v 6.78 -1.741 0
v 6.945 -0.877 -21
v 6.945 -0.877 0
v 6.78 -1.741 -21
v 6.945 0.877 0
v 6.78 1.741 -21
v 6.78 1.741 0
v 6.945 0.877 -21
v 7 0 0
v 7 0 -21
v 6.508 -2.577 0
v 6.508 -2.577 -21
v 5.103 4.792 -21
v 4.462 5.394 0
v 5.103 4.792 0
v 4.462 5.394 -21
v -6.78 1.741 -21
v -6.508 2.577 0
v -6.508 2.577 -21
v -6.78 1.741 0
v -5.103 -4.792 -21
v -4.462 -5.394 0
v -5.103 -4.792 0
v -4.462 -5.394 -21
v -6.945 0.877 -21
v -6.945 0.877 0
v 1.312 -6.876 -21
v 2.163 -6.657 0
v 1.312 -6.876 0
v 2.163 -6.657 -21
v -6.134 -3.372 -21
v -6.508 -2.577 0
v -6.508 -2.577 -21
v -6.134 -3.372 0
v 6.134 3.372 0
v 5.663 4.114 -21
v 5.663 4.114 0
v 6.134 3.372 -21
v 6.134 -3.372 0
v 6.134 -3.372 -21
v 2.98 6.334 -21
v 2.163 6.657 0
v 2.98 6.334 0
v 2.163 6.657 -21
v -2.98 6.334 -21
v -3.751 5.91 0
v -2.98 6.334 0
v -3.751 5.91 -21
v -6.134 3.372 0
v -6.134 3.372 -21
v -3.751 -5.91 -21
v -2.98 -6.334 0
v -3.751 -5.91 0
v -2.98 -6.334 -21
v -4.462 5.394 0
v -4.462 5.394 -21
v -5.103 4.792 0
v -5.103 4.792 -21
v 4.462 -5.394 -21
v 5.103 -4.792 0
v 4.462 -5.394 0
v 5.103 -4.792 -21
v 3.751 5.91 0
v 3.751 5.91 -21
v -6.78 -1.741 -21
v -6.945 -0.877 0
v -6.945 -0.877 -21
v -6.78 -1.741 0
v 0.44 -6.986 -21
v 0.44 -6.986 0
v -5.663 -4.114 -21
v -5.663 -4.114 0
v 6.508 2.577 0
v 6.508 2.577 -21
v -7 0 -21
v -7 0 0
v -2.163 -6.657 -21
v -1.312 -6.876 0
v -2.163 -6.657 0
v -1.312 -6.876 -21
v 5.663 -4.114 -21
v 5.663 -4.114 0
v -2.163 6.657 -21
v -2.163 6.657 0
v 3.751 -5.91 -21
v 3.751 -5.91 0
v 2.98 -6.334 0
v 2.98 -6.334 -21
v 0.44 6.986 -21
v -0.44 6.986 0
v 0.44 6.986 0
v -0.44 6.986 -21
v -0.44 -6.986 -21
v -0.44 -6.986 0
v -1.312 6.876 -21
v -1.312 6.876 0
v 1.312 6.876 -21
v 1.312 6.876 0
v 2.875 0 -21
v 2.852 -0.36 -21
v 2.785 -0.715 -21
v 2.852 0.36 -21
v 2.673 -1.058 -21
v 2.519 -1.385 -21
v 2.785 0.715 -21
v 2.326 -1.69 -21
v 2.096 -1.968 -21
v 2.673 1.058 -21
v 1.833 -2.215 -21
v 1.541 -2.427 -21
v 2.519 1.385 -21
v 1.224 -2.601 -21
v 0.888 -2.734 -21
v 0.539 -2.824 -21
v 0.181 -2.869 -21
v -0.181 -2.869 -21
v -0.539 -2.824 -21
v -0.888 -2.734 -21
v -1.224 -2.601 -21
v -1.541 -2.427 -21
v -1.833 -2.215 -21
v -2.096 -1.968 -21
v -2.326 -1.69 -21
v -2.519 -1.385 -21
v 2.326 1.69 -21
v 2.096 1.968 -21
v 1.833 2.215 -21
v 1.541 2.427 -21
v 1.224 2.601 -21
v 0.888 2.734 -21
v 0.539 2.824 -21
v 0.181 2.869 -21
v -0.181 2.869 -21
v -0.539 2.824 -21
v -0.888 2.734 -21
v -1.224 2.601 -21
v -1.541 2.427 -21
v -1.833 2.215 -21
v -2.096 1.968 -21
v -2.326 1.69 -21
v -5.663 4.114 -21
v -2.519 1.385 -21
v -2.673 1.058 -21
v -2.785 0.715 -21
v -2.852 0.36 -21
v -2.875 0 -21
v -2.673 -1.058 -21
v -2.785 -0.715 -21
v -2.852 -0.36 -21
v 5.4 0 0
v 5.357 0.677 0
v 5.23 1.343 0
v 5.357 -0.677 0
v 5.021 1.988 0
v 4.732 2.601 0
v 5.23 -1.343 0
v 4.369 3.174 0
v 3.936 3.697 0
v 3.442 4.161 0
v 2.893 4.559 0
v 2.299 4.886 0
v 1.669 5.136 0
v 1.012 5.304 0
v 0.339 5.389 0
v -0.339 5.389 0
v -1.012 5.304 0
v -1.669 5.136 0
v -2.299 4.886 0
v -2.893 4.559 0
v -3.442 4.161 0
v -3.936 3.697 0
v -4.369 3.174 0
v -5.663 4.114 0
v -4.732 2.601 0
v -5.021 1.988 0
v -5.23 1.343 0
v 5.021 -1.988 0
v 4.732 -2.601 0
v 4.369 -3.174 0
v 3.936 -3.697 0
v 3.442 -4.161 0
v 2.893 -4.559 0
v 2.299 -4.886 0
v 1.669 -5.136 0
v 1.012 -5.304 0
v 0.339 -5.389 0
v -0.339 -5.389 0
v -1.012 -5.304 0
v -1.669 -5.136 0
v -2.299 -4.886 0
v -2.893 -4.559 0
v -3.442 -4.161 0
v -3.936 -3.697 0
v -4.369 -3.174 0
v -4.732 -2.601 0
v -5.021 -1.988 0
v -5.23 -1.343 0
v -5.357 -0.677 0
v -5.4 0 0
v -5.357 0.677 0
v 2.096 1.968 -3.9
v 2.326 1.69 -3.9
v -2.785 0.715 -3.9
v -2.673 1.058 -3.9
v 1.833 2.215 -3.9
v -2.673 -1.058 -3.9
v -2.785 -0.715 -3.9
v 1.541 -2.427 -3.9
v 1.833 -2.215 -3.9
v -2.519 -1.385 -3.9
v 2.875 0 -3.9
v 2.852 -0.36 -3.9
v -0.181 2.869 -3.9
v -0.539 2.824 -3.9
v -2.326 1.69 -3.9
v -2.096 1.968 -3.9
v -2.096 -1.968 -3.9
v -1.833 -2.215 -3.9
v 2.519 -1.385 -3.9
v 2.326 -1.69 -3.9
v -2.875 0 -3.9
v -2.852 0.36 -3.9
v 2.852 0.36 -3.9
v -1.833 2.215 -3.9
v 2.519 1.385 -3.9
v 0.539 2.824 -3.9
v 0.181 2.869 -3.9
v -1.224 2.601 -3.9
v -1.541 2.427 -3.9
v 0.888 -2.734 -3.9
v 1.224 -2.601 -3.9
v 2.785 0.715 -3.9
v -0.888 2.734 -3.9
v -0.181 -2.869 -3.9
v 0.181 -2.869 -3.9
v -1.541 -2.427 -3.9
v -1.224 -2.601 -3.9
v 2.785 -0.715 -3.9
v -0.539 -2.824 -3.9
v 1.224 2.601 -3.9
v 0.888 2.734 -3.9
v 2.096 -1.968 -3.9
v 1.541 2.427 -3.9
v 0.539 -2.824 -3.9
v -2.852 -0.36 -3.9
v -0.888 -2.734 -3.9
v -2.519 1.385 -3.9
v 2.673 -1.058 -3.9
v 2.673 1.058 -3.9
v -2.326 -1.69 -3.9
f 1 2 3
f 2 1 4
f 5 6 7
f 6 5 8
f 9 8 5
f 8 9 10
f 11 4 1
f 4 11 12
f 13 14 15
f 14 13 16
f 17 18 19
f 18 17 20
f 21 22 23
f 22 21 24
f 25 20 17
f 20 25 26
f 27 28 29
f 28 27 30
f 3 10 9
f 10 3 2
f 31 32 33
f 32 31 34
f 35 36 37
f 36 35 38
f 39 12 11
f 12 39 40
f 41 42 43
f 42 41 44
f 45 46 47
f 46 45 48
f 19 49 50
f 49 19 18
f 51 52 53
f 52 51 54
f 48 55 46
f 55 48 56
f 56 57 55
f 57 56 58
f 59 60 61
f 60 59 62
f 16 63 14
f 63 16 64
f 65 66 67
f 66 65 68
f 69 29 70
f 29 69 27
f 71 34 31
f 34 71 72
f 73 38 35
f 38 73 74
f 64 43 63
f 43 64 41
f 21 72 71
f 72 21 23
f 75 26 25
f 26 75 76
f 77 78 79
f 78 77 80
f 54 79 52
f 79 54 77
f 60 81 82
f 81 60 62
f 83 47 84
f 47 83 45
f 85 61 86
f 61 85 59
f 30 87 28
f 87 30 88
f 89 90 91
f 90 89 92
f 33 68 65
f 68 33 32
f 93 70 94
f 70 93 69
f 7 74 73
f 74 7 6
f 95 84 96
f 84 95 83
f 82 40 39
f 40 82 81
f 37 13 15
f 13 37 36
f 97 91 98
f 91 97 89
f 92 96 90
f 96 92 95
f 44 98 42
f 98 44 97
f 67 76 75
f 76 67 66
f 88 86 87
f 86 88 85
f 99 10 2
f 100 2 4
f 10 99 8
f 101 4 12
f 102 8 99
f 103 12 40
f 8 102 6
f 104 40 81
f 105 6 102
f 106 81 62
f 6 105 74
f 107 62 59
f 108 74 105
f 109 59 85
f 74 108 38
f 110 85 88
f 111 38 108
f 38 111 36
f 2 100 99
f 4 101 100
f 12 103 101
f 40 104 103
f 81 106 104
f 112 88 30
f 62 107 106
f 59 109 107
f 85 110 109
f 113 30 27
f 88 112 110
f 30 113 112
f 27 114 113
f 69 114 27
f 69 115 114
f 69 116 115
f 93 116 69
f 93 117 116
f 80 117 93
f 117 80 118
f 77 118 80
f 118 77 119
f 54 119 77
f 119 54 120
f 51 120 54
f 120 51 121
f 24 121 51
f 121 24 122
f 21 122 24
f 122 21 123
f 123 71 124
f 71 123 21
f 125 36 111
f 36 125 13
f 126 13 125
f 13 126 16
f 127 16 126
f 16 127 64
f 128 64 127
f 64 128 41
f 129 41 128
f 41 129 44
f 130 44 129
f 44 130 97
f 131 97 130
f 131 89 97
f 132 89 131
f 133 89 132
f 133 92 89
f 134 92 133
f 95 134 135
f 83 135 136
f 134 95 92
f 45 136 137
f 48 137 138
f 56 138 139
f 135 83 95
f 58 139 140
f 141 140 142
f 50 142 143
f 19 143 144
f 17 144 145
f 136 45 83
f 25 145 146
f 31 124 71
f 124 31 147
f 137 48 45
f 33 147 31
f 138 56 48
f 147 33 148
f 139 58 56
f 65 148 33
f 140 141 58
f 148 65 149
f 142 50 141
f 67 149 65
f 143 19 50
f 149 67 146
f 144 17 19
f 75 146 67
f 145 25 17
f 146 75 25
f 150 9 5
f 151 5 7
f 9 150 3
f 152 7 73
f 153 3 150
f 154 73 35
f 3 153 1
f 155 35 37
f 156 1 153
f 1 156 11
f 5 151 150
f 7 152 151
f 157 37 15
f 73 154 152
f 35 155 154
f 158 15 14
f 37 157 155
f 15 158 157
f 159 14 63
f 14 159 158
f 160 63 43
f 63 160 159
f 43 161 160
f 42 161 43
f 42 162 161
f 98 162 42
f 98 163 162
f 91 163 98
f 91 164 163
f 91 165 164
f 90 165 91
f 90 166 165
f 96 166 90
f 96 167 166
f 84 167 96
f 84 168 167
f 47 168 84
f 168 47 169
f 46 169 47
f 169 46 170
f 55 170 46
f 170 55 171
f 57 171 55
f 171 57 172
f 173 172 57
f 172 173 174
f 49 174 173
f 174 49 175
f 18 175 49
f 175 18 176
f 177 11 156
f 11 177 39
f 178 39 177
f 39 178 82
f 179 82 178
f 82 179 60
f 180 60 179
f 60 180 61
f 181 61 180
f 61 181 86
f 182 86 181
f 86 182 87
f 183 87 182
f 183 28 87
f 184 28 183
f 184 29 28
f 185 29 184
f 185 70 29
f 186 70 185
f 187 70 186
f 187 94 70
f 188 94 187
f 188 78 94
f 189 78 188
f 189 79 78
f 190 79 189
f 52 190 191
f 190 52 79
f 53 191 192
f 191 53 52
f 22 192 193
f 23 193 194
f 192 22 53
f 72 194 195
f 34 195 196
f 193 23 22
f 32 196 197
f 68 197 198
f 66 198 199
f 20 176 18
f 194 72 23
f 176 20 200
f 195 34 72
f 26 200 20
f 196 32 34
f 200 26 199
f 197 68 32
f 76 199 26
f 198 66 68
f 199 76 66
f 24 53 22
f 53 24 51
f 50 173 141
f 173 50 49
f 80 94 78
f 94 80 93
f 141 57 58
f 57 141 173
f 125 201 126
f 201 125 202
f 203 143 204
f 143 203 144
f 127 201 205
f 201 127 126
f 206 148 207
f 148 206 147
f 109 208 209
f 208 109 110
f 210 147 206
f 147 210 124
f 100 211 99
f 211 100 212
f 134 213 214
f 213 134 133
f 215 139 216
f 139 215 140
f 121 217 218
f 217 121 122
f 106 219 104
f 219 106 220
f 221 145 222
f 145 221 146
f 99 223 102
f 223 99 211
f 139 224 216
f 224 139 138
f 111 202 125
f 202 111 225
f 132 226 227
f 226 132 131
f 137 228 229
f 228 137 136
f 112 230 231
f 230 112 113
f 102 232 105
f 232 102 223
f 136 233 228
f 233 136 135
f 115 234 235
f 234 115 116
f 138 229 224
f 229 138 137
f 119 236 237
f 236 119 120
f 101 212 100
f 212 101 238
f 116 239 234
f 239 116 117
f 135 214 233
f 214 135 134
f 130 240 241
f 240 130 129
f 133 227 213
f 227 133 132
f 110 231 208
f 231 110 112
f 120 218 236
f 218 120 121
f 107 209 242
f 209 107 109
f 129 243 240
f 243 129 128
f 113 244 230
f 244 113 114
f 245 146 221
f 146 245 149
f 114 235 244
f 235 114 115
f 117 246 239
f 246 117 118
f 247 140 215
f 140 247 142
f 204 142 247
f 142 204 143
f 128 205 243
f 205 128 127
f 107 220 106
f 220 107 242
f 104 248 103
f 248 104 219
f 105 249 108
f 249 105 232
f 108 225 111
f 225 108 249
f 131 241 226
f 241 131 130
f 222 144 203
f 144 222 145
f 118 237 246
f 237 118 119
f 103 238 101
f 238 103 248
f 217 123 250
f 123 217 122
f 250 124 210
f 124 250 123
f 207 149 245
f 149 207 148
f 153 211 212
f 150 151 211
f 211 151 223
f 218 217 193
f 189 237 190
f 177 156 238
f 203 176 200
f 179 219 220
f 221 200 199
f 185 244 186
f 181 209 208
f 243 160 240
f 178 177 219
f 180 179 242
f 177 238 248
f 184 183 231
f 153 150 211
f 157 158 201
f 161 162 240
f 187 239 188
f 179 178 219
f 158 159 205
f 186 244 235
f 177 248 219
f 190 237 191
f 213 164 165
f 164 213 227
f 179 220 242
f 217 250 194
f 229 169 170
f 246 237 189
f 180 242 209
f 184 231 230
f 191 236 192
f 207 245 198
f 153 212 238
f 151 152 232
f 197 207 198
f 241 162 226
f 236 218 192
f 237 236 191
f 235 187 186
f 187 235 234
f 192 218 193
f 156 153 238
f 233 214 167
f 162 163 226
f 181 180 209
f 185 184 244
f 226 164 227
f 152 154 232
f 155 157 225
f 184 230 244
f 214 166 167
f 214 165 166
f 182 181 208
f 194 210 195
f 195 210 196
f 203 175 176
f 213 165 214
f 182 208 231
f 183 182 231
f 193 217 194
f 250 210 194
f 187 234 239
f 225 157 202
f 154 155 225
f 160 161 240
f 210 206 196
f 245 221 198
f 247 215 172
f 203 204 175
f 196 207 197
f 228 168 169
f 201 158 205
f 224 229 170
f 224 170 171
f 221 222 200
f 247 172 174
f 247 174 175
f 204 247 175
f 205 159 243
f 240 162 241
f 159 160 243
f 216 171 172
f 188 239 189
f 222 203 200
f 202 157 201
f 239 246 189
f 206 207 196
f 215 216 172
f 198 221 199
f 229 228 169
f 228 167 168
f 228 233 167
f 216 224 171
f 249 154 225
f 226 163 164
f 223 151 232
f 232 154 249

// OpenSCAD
$fn = 50;

difference() {
	union() {
		translate(v = [0, 0, -21.0]) {
			cylinder(h = 21, r = 7.0);
		}
		#translate(v = [0, 0, -24.0]) {
			cylinder(h = 24, r = 2.875);
		}
	}
	union() {
		translate(v = [0, 0, 0]) {
			rotate(a = [0, 0, 0]) {
				difference() {
					union() {
						translate(v = [0, 0, -24.0]) {
							cylinder(h = 24, r = 2.6);
						}
						translate(v = [0, 0, -3.9]) {
							cylinder(h = 3.9, r1 = 2.875, r2 = 5.4);
						}
						translate(v = [0, 0, -24.0]) {
							cylinder(h = 24, r = 2.875);
						}
						translate(v = [0, 0, -24.0]) {
							cylinder(h = 24, r = 2.6);
						}
					}
					union();
				}
			}
		}
	}
}
